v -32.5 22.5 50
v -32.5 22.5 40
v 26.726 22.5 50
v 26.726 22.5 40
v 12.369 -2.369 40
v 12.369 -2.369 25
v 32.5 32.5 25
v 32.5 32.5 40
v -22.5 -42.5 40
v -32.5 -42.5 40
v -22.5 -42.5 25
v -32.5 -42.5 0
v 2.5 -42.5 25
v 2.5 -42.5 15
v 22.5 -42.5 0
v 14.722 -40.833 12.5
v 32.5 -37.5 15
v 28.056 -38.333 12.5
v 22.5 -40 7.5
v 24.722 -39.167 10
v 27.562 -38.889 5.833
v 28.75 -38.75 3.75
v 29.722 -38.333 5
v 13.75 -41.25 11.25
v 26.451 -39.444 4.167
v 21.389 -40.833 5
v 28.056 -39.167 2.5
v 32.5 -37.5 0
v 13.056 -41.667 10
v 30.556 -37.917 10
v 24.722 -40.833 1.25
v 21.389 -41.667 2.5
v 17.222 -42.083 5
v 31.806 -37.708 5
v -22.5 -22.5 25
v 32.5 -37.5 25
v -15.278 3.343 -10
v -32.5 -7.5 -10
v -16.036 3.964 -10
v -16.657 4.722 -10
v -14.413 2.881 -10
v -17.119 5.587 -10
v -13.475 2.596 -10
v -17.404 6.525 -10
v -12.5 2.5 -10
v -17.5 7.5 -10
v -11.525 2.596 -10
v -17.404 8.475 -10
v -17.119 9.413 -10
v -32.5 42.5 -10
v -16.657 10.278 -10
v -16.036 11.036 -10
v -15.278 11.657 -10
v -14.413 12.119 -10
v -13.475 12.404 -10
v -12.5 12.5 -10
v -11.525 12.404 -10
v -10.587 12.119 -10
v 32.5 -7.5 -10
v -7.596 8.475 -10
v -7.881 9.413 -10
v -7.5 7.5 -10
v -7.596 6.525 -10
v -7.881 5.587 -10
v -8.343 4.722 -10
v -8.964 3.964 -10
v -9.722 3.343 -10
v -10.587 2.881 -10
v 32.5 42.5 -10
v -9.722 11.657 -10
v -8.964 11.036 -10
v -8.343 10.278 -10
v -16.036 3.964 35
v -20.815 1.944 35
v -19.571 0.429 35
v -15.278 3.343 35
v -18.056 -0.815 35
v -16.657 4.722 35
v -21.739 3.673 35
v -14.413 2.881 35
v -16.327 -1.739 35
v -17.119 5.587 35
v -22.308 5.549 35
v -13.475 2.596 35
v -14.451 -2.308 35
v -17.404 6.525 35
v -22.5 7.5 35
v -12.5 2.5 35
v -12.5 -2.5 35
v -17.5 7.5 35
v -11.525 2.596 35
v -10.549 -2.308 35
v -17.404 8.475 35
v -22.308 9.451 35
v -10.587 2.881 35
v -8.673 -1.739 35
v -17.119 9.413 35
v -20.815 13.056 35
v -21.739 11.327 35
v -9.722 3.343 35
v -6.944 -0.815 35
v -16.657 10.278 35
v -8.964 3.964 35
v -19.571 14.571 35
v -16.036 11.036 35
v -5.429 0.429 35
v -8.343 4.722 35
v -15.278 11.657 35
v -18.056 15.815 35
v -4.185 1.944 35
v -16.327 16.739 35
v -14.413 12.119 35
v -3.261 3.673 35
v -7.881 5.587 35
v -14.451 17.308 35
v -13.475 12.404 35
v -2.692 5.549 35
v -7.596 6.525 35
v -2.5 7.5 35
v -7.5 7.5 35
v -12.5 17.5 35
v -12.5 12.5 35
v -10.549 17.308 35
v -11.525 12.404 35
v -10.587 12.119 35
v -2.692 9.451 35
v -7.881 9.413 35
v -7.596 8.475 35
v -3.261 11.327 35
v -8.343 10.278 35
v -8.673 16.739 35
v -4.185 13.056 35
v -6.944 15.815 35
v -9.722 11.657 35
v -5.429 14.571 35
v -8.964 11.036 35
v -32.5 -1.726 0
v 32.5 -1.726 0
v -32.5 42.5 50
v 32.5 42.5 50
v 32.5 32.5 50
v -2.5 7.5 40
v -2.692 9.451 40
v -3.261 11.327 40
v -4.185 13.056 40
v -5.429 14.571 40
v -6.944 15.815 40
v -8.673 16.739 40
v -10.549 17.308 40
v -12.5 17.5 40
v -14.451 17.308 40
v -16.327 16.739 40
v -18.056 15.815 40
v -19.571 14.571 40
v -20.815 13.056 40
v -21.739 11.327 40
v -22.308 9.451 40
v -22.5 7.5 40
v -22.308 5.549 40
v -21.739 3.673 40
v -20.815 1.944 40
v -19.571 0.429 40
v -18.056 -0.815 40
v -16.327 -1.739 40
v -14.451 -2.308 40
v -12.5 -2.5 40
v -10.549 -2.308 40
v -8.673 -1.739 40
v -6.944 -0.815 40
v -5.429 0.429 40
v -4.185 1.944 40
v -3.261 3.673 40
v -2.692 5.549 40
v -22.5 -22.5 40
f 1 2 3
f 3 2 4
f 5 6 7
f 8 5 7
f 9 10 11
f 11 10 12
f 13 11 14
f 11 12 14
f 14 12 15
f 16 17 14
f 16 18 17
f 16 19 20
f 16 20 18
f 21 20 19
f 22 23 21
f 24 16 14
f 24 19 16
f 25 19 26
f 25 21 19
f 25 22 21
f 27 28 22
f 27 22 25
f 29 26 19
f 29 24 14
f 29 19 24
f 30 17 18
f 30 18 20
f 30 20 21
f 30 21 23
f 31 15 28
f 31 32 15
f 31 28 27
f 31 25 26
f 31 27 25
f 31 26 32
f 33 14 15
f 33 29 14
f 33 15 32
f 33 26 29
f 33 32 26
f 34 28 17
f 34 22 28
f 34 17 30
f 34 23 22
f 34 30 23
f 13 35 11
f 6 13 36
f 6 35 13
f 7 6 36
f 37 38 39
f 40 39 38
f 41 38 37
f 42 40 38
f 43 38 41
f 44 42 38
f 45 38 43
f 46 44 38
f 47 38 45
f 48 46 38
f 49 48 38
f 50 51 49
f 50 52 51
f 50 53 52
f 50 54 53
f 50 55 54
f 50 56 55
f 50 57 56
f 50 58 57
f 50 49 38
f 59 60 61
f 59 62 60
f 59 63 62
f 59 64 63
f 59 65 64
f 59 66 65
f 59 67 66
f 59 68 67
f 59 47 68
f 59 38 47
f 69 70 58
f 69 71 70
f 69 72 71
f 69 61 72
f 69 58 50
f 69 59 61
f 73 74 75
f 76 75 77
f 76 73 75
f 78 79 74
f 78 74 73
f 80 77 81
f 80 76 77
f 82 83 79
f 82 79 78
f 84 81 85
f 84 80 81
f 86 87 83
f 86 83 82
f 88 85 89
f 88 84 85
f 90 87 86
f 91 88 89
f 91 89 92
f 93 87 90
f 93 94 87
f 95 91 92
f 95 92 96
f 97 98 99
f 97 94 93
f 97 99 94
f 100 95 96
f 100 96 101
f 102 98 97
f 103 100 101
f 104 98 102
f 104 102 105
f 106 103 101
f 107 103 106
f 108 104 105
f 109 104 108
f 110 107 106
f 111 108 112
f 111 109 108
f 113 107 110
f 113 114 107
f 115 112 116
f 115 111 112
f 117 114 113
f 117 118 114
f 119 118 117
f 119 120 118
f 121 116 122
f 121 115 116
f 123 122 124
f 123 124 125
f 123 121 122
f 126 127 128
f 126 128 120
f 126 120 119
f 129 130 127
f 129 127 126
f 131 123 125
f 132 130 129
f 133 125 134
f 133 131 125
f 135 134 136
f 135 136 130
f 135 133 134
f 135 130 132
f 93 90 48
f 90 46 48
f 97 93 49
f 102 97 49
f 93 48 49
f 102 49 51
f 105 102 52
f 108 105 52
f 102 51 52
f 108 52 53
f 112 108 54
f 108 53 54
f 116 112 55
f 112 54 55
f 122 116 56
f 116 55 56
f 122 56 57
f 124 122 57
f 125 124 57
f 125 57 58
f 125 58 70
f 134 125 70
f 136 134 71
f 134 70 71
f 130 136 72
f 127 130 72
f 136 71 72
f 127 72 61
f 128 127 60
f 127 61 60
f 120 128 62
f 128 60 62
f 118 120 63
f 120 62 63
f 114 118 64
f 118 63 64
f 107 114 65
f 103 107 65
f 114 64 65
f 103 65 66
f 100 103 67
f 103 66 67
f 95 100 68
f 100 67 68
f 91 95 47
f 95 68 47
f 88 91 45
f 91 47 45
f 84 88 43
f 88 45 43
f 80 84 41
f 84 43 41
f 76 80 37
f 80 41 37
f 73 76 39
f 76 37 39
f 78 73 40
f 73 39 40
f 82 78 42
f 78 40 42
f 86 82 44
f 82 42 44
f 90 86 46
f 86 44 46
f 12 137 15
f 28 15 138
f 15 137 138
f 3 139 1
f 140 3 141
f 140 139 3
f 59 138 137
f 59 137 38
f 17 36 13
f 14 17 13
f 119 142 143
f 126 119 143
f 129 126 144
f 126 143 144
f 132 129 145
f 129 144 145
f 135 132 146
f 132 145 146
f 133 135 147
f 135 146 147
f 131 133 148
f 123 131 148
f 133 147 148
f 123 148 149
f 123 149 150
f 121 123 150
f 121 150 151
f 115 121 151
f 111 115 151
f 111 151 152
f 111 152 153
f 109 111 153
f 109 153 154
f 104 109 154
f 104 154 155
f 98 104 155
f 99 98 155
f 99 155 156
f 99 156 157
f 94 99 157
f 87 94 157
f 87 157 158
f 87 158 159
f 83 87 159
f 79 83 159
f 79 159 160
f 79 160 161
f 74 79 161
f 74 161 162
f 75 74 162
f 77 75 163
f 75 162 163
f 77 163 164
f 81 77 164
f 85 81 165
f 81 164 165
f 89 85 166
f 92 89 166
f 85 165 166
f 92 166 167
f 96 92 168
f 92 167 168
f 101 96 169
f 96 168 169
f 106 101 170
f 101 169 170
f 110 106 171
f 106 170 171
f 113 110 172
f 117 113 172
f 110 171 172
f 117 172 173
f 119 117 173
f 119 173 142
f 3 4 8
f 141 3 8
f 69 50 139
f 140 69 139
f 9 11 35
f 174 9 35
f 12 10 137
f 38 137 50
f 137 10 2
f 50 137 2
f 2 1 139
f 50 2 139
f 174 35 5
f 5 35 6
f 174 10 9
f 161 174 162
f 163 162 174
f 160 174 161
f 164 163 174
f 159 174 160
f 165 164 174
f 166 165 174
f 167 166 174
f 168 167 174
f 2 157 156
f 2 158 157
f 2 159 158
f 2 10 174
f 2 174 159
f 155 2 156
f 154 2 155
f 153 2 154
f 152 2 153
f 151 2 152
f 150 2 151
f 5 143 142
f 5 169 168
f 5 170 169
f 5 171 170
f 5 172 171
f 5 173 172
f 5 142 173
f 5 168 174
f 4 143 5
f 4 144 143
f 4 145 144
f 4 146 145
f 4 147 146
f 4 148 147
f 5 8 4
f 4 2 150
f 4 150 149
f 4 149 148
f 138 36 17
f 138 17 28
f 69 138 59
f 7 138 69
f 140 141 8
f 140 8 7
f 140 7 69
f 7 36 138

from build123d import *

# Parameters (mm, degrees)
F0_W            = 65
F0_H            = 85
F1_DEPTH        = 25
F3_DEPTH        = 15
F5_DEPTH        = 10
F9_DEPTH        = 10
F12_DEPTH       = 65
F14_D           = 10
F14_CBORE_D     = 20
F14_CBORE_DEPTH = 5


with BuildPart() as f1:
    # F0 (on Top) → F1 (new body)
    with BuildSketch(Plane.XY):
        Rectangle(F0_W, F0_H)
    extrude(amount=F1_DEPTH)

    # F2 (on face) → F3 (join)
    with BuildSketch(Plane.XY.offset(25)):
        Polygon((-32.5, -42.5), (-22.5, -42.5), (-22.5, -22.5), (12.368603, -2.368603), (32.5, 32.5), (32.5, 42.5), (-32.5, 42.5), align=None)
    extrude(amount=F3_DEPTH)

    # F4 (on face) → F5 (join)
    with BuildSketch(Plane.XY.offset(40)):
        Polygon((-32.5, 42.5), (-32.5, 22.5), (26.726497, 22.5), (32.5, 32.5), (32.5, 42.5), align=None)
    extrude(amount=F5_DEPTH)

    # F8 (on face) → F9 (cut)
    with BuildSketch(Plane.XY.offset(25)):
        Polygon((32.5, -37.5), (2.5, -42.5), (32.5, -42.5), align=None)
    extrude(amount=-F9_DEPTH, mode=Mode.SUBTRACT)

    # F9_face (on face) → F10 section 0
    with BuildSketch(Plane(origin=(22.5, -40.833333, 15), x_dir=(1, 0, 0), z_dir=(0, 0, 1))):
        Polygon((10, 3.333333), (-20, -1.666667), (10, -1.666667), align=None)
    # F6 (on face) → F10 section 1
    with BuildSketch(Plane(origin=(0, 0, 0), x_dir=(1, 0, 0), z_dir=(0, 0, -1))):
        Polygon((32.5, 42.5), (22.5, 42.5), (32.5, 37.5), align=None)
    loft(mode=Mode.SUBTRACT)

    # F11 (on face) → F12 (join, through all)
    with BuildSketch(Plane.YZ.offset(32.5)):
        Polygon((42.5, -10), (42.5, 0), (-1.726497, 0), (-7.5, -10), align=None)
    extrude(amount=-F12_DEPTH)

    # F14 (through all)
    with Locations(Plane.XY.offset(40)):
        with Locations((-12.5, 7.5)):
            CounterBoreHole(F14_D / 2, F14_CBORE_D / 2, F14_CBORE_DEPTH)


solid = f1.part
